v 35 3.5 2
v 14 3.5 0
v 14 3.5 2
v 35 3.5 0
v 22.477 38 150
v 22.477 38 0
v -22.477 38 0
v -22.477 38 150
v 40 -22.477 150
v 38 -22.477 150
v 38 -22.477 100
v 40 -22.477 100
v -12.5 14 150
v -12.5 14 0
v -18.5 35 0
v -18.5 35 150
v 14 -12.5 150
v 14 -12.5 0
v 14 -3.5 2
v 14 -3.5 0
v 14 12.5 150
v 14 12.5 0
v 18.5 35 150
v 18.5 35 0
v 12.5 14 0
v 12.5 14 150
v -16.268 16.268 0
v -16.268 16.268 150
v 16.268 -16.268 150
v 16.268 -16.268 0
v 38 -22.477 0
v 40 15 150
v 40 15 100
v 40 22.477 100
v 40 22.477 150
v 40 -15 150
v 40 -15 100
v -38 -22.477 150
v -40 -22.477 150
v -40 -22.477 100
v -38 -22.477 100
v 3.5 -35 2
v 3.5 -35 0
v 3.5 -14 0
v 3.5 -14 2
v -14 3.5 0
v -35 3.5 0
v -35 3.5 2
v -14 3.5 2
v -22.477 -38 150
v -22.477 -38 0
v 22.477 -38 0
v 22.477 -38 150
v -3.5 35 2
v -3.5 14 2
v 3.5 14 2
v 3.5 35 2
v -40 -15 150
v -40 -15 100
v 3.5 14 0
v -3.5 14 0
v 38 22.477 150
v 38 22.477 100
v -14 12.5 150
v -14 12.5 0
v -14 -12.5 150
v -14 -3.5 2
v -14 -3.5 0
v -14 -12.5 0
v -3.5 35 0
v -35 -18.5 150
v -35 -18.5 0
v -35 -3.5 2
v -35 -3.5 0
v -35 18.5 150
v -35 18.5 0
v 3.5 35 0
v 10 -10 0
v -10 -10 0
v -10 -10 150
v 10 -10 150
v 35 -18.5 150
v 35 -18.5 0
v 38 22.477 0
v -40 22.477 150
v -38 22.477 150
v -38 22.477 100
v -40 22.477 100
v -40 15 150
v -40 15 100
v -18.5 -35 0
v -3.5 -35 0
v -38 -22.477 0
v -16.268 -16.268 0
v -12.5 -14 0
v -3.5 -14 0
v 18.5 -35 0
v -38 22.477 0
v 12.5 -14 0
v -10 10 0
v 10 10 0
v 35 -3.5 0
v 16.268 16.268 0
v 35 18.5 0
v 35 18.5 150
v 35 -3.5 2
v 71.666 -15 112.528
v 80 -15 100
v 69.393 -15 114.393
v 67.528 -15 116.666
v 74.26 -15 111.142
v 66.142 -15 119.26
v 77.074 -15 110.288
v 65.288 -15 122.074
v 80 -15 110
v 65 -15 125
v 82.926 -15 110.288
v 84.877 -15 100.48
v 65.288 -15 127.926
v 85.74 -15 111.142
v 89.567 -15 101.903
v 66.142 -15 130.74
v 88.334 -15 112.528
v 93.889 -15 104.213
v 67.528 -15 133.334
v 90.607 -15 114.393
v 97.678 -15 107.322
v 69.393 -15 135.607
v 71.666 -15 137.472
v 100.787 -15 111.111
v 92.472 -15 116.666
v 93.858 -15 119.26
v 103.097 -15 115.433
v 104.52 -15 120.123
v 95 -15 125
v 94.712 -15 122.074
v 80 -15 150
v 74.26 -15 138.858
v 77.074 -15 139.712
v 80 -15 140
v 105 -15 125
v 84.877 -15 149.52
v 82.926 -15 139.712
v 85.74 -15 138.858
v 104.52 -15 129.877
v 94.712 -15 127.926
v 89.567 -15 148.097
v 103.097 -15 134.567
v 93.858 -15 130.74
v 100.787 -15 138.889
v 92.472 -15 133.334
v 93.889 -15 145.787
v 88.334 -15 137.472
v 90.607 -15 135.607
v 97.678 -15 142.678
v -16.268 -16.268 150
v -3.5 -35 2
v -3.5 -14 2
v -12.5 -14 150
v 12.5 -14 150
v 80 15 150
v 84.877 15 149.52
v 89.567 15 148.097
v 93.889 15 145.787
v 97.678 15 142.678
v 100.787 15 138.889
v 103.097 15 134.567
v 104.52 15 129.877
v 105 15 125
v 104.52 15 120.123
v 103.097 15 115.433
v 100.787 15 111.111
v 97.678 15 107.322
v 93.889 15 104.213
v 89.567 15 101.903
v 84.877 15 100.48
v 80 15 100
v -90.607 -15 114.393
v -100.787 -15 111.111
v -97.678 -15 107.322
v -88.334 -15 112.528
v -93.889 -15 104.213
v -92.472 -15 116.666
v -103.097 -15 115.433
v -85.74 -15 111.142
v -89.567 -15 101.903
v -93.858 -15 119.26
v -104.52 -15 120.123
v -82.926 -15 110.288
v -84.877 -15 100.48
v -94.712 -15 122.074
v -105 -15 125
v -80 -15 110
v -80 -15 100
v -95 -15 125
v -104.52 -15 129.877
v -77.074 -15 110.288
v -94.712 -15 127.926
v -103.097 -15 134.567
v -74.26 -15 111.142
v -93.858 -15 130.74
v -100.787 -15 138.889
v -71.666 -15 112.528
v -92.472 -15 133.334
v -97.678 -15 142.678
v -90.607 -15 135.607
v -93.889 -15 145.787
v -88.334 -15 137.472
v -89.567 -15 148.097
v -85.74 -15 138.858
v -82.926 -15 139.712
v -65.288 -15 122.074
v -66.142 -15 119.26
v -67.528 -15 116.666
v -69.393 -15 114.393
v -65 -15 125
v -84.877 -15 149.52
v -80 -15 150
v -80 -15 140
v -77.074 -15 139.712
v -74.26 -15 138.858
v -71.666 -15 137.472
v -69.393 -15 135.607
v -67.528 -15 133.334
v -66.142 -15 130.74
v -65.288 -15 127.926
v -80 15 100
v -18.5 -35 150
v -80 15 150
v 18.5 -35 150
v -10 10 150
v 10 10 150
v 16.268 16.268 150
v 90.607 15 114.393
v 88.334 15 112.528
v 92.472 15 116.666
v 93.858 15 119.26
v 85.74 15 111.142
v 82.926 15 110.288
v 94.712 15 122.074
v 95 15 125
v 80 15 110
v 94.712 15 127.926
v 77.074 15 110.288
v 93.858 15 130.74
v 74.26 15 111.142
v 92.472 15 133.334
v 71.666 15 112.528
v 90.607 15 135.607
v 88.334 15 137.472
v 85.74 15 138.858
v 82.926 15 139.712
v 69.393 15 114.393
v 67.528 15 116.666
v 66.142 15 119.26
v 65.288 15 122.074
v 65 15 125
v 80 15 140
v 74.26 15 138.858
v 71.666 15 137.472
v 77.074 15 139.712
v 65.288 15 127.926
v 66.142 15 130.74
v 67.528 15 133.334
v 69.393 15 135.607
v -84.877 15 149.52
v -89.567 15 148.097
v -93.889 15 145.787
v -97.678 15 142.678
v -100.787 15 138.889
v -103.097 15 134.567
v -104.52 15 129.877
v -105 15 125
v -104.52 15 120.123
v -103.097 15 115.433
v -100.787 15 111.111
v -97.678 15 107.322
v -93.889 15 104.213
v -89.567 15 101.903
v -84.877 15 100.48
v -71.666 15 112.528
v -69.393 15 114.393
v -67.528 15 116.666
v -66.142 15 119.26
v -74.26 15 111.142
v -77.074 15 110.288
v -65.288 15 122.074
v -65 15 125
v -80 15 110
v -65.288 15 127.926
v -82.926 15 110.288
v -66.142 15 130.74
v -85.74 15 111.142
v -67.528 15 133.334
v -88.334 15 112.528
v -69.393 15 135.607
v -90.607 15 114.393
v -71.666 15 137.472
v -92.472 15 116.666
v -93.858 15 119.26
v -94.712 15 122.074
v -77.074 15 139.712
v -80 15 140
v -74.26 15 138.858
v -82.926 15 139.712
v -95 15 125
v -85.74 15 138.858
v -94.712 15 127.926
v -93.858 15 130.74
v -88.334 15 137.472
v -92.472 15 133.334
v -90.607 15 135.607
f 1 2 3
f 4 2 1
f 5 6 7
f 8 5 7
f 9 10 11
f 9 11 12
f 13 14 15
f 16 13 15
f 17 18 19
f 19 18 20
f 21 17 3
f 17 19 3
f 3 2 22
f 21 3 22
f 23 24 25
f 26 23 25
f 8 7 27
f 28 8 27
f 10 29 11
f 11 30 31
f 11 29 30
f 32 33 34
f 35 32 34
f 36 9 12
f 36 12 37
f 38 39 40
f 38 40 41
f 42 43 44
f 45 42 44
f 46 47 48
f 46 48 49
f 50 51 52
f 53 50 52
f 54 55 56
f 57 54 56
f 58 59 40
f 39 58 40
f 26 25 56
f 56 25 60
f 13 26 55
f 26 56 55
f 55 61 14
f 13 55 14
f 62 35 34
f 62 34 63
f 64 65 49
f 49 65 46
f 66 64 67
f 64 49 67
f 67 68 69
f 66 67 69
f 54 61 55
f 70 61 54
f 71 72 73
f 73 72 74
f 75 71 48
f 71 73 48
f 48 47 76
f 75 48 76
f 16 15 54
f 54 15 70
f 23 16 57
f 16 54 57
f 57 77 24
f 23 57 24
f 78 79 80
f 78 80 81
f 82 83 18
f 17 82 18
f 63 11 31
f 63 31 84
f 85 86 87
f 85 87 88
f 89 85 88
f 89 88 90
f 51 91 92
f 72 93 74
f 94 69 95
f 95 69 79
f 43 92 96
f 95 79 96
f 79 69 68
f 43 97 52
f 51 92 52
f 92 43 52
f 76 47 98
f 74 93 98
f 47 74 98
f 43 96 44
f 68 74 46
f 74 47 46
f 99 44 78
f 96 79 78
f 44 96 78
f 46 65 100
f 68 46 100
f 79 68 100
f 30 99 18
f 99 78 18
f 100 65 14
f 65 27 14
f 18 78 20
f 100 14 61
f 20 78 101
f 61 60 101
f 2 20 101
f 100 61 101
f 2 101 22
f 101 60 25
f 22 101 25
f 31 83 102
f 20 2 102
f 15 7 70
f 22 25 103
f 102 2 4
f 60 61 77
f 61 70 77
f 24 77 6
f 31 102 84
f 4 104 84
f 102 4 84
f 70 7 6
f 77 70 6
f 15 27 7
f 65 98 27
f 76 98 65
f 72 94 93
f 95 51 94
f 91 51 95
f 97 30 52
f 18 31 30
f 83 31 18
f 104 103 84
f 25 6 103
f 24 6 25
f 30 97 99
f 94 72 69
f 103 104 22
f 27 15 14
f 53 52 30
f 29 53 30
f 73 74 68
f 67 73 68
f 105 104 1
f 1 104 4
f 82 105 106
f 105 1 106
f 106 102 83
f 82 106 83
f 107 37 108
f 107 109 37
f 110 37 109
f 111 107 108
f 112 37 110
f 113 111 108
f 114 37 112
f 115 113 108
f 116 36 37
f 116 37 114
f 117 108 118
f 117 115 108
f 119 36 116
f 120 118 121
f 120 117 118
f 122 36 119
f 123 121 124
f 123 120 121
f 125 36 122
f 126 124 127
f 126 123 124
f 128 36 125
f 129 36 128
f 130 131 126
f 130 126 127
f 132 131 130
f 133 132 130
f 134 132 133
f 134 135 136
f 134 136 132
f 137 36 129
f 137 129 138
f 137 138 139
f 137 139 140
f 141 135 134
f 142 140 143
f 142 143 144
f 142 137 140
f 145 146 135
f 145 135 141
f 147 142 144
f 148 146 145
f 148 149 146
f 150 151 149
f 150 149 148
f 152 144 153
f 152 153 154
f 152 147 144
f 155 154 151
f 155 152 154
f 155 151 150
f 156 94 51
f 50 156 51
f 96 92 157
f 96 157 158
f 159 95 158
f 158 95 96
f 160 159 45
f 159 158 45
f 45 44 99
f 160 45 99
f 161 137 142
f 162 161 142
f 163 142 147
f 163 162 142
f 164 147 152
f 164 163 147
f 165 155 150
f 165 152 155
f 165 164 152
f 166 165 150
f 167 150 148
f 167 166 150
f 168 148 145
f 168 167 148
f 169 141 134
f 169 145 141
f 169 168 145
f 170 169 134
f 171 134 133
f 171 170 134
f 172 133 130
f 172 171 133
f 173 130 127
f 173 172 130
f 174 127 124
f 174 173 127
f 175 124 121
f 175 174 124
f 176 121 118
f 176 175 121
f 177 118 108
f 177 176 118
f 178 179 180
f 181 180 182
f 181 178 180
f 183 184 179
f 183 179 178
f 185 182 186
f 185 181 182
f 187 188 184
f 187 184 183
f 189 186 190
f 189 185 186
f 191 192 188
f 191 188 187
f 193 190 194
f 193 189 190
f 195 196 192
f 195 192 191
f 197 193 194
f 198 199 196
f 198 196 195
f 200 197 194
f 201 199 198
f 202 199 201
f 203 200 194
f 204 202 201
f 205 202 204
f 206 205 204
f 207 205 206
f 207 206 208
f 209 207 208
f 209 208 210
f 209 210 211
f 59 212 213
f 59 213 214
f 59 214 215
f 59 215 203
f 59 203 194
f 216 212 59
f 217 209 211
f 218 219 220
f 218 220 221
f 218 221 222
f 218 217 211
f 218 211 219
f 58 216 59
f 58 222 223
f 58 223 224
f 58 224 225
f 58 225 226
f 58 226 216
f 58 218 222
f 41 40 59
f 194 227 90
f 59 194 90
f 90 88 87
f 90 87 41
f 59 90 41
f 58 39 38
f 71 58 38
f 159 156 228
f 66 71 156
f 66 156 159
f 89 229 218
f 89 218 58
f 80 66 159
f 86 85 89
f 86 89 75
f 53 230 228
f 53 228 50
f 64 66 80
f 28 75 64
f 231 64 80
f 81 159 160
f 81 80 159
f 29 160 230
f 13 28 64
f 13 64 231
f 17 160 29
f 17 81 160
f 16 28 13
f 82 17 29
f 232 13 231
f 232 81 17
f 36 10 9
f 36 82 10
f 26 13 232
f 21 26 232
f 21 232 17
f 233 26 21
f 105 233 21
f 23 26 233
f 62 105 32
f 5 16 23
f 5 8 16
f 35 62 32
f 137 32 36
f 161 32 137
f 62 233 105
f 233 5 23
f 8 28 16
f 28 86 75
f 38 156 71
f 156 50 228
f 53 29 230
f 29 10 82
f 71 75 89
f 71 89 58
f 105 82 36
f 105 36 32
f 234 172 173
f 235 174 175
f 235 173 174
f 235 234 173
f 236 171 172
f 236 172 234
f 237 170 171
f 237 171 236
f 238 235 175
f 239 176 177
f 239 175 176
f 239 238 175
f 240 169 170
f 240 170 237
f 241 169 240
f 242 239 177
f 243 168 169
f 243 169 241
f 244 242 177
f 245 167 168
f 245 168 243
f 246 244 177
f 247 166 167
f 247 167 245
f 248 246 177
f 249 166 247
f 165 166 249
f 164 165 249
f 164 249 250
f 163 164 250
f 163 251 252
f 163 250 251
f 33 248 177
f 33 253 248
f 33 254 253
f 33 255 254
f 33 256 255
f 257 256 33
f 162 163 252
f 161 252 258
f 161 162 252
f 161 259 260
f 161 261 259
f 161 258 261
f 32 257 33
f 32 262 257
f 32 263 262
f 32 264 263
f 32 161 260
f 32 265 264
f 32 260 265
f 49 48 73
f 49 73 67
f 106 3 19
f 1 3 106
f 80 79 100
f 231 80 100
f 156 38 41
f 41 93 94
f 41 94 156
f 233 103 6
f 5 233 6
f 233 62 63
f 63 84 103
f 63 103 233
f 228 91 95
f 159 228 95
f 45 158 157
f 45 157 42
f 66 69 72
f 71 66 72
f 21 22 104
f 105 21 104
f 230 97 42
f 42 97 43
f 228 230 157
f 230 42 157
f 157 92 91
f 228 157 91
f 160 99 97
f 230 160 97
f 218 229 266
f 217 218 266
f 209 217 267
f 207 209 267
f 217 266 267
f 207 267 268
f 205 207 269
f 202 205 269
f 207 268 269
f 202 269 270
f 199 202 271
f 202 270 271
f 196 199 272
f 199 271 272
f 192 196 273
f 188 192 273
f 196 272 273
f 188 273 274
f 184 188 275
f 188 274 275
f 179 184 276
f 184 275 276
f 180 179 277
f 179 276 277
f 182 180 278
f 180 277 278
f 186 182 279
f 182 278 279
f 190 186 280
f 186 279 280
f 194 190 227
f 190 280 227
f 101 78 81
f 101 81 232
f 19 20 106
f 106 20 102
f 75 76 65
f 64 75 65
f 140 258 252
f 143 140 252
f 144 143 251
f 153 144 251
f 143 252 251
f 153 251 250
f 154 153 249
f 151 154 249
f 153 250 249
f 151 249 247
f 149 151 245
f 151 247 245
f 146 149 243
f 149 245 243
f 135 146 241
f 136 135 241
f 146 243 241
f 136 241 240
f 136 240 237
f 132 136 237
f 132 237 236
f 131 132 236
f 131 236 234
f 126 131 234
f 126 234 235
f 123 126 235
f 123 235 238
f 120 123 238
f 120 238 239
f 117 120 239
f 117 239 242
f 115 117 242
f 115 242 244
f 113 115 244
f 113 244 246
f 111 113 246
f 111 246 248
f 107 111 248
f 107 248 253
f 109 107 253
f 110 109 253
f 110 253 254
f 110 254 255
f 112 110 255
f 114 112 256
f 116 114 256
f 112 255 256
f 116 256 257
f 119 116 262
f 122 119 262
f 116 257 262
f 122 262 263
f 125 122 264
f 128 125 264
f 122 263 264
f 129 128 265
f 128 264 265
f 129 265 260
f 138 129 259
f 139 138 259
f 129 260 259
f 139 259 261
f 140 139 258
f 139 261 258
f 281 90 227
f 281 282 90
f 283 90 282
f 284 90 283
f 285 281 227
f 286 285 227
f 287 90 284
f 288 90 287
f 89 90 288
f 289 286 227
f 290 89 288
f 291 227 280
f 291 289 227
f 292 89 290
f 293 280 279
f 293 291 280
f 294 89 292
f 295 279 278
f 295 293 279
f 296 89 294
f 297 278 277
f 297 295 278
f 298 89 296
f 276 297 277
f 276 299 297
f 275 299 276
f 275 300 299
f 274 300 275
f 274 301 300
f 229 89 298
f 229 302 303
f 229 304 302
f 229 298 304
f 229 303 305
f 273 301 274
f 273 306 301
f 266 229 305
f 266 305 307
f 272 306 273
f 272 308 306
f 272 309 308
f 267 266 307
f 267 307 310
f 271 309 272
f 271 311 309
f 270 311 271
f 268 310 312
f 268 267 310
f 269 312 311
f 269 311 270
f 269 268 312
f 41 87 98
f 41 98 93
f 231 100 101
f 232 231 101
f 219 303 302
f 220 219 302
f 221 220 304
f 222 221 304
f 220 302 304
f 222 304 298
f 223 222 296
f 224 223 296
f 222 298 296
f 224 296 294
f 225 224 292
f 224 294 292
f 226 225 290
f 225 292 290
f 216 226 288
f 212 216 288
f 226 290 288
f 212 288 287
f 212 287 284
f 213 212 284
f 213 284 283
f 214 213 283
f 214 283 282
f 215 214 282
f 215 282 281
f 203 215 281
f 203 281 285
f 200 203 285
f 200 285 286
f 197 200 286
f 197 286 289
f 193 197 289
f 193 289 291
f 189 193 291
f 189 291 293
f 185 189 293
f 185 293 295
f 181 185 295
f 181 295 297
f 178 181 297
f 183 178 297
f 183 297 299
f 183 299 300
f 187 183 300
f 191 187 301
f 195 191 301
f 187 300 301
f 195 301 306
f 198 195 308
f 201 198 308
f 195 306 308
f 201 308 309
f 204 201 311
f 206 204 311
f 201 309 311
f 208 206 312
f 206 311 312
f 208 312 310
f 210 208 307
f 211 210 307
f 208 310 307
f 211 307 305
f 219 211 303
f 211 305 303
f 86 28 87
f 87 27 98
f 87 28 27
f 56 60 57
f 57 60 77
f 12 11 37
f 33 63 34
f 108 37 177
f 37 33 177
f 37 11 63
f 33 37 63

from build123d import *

# Parameters (mm, degrees)
SKETCH1_W           = 20
SKETCH1_H           = 20
BOSS_EXTRUDE1_DEPTH = 150
SKETCH2_W           = 7
SKETCH2_H           = 21
SKETCH2_W_2         = 21
SKETCH2_H_2         = 7
BOSS_EXTRUDE2_DEPTH = 2
BOSS_EXTRUDE3_DEPTH = 50
SKETCH4_R           = 15
CUT_EXTRUDE1_DEPTH  = 50


with BuildPart() as part:
    # Sketch1 → Boss-Extrude1 (new body)
    with BuildSketch(Plane.XY):
        Polygon((22.477189953, 38), (-22.477189953, 38), (-16.268065934, 16.268065934), (-38, 22.477189953), (-38, -22.477189953), (-16.268065934, -16.268065934), (-22.477189953, -38), (22.477189953, -38), (16.268065934, -16.268065934), (38, -22.477189953), (38, 22.477189953), (16.268065934, 16.268065934), align=None)
        Polygon((12.5, 14), (-12.5, 14), (-18.5, 35), (18.5, 35), align=None, mode=Mode.SUBTRACT)
        Rectangle(SKETCH1_W, SKETCH1_H, mode=Mode.SUBTRACT)
        Polygon((14, -12.5), (14, 12.5), (35, 18.5), (35, -18.5), align=None, mode=Mode.SUBTRACT)
        Polygon((-12.5, -14), (12.5, -14), (18.5, -35), (-18.5, -35), align=None, mode=Mode.SUBTRACT)
        Polygon((-14, 12.5), (-14, -12.5), (-35, -18.5), (-35, 18.5), align=None, mode=Mode.SUBTRACT)
    extrude(amount=BOSS_EXTRUDE1_DEPTH)

    # Sketch2 → Boss-Extrude2 (add)
    with BuildSketch(Plane.XY):
        with Locations((0, 24.5)):
            Rectangle(SKETCH2_W, SKETCH2_H)
        with Locations((24.5, 0)):
            Rectangle(SKETCH2_W_2, SKETCH2_H_2)
        with Locations((0, -24.5)):
            Rectangle(SKETCH2_W, SKETCH2_H)
        with Locations((-24.5, 0)):
            Rectangle(SKETCH2_W_2, SKETCH2_H_2)
    extrude(amount=BOSS_EXTRUDE2_DEPTH)

    # Sketch3 → Boss-Extrude3 (add)
    with BuildSketch(Plane.XY.offset(150)):
        Polygon((40, -22.477189953), (40, -15), (105, -15), (105, 15), (40, 15), (40, 22.477189953), (38, 22.477189953), (38, -22.477189953), align=None)
        Polygon((-38, 22.477189953), (-40, 22.477189953), (-40, 15), (-105, 15), (-105, -15), (-40, -15), (-40, -22.477189953), (-38, -22.477189953), align=None)
    extrude(amount=-BOSS_EXTRUDE3_DEPTH)

    # Sketch4 → Cut-Extrude1 (cut)
    with BuildSketch(Plane(origin=(0, 15, 0), x_dir=(1, 0, 0), z_dir=(0, 1, 0))):
        with Locations(Location((80, -125, 0), (0, 0, 270))):
            Circle(SKETCH4_R)
        with Locations(Location((-80, -125, 0), (0, 0, 270))):
            Circle(SKETCH4_R)
        with BuildLine():
            Line((80, -100), (80, -91.906284046))
            Line((80, -91.906284046), (116.237187359, -91.906284046))
            Line((116.237187359, -91.906284046), (116.237187359, -153.794533515))
            Line((116.237187359, -153.794533515), (80, -153.794533515))
            Line((80, -153.794533515), (80, -150))
            ThreePointArc((80, -150), (105, -125), (80, -100))
        make_face()
        with BuildLine():
            Line((-80, -153.794533515), (-80, -150))
            ThreePointArc((-80, -150), (-105, -125), (-80, -100))
            Line((-80, -100), (-80, -91.906284046))
            Line((-80, -91.906284046), (-116.237187359, -91.906284046))
            Line((-116.237187359, -91.906284046), (-116.237187359, -153.794533515))
            Line((-116.237187359, -153.794533515), (-80, -153.794533515))
        make_face()
    extrude(amount=-CUT_EXTRUDE1_DEPTH, mode=Mode.SUBTRACT)


solid = part.part
